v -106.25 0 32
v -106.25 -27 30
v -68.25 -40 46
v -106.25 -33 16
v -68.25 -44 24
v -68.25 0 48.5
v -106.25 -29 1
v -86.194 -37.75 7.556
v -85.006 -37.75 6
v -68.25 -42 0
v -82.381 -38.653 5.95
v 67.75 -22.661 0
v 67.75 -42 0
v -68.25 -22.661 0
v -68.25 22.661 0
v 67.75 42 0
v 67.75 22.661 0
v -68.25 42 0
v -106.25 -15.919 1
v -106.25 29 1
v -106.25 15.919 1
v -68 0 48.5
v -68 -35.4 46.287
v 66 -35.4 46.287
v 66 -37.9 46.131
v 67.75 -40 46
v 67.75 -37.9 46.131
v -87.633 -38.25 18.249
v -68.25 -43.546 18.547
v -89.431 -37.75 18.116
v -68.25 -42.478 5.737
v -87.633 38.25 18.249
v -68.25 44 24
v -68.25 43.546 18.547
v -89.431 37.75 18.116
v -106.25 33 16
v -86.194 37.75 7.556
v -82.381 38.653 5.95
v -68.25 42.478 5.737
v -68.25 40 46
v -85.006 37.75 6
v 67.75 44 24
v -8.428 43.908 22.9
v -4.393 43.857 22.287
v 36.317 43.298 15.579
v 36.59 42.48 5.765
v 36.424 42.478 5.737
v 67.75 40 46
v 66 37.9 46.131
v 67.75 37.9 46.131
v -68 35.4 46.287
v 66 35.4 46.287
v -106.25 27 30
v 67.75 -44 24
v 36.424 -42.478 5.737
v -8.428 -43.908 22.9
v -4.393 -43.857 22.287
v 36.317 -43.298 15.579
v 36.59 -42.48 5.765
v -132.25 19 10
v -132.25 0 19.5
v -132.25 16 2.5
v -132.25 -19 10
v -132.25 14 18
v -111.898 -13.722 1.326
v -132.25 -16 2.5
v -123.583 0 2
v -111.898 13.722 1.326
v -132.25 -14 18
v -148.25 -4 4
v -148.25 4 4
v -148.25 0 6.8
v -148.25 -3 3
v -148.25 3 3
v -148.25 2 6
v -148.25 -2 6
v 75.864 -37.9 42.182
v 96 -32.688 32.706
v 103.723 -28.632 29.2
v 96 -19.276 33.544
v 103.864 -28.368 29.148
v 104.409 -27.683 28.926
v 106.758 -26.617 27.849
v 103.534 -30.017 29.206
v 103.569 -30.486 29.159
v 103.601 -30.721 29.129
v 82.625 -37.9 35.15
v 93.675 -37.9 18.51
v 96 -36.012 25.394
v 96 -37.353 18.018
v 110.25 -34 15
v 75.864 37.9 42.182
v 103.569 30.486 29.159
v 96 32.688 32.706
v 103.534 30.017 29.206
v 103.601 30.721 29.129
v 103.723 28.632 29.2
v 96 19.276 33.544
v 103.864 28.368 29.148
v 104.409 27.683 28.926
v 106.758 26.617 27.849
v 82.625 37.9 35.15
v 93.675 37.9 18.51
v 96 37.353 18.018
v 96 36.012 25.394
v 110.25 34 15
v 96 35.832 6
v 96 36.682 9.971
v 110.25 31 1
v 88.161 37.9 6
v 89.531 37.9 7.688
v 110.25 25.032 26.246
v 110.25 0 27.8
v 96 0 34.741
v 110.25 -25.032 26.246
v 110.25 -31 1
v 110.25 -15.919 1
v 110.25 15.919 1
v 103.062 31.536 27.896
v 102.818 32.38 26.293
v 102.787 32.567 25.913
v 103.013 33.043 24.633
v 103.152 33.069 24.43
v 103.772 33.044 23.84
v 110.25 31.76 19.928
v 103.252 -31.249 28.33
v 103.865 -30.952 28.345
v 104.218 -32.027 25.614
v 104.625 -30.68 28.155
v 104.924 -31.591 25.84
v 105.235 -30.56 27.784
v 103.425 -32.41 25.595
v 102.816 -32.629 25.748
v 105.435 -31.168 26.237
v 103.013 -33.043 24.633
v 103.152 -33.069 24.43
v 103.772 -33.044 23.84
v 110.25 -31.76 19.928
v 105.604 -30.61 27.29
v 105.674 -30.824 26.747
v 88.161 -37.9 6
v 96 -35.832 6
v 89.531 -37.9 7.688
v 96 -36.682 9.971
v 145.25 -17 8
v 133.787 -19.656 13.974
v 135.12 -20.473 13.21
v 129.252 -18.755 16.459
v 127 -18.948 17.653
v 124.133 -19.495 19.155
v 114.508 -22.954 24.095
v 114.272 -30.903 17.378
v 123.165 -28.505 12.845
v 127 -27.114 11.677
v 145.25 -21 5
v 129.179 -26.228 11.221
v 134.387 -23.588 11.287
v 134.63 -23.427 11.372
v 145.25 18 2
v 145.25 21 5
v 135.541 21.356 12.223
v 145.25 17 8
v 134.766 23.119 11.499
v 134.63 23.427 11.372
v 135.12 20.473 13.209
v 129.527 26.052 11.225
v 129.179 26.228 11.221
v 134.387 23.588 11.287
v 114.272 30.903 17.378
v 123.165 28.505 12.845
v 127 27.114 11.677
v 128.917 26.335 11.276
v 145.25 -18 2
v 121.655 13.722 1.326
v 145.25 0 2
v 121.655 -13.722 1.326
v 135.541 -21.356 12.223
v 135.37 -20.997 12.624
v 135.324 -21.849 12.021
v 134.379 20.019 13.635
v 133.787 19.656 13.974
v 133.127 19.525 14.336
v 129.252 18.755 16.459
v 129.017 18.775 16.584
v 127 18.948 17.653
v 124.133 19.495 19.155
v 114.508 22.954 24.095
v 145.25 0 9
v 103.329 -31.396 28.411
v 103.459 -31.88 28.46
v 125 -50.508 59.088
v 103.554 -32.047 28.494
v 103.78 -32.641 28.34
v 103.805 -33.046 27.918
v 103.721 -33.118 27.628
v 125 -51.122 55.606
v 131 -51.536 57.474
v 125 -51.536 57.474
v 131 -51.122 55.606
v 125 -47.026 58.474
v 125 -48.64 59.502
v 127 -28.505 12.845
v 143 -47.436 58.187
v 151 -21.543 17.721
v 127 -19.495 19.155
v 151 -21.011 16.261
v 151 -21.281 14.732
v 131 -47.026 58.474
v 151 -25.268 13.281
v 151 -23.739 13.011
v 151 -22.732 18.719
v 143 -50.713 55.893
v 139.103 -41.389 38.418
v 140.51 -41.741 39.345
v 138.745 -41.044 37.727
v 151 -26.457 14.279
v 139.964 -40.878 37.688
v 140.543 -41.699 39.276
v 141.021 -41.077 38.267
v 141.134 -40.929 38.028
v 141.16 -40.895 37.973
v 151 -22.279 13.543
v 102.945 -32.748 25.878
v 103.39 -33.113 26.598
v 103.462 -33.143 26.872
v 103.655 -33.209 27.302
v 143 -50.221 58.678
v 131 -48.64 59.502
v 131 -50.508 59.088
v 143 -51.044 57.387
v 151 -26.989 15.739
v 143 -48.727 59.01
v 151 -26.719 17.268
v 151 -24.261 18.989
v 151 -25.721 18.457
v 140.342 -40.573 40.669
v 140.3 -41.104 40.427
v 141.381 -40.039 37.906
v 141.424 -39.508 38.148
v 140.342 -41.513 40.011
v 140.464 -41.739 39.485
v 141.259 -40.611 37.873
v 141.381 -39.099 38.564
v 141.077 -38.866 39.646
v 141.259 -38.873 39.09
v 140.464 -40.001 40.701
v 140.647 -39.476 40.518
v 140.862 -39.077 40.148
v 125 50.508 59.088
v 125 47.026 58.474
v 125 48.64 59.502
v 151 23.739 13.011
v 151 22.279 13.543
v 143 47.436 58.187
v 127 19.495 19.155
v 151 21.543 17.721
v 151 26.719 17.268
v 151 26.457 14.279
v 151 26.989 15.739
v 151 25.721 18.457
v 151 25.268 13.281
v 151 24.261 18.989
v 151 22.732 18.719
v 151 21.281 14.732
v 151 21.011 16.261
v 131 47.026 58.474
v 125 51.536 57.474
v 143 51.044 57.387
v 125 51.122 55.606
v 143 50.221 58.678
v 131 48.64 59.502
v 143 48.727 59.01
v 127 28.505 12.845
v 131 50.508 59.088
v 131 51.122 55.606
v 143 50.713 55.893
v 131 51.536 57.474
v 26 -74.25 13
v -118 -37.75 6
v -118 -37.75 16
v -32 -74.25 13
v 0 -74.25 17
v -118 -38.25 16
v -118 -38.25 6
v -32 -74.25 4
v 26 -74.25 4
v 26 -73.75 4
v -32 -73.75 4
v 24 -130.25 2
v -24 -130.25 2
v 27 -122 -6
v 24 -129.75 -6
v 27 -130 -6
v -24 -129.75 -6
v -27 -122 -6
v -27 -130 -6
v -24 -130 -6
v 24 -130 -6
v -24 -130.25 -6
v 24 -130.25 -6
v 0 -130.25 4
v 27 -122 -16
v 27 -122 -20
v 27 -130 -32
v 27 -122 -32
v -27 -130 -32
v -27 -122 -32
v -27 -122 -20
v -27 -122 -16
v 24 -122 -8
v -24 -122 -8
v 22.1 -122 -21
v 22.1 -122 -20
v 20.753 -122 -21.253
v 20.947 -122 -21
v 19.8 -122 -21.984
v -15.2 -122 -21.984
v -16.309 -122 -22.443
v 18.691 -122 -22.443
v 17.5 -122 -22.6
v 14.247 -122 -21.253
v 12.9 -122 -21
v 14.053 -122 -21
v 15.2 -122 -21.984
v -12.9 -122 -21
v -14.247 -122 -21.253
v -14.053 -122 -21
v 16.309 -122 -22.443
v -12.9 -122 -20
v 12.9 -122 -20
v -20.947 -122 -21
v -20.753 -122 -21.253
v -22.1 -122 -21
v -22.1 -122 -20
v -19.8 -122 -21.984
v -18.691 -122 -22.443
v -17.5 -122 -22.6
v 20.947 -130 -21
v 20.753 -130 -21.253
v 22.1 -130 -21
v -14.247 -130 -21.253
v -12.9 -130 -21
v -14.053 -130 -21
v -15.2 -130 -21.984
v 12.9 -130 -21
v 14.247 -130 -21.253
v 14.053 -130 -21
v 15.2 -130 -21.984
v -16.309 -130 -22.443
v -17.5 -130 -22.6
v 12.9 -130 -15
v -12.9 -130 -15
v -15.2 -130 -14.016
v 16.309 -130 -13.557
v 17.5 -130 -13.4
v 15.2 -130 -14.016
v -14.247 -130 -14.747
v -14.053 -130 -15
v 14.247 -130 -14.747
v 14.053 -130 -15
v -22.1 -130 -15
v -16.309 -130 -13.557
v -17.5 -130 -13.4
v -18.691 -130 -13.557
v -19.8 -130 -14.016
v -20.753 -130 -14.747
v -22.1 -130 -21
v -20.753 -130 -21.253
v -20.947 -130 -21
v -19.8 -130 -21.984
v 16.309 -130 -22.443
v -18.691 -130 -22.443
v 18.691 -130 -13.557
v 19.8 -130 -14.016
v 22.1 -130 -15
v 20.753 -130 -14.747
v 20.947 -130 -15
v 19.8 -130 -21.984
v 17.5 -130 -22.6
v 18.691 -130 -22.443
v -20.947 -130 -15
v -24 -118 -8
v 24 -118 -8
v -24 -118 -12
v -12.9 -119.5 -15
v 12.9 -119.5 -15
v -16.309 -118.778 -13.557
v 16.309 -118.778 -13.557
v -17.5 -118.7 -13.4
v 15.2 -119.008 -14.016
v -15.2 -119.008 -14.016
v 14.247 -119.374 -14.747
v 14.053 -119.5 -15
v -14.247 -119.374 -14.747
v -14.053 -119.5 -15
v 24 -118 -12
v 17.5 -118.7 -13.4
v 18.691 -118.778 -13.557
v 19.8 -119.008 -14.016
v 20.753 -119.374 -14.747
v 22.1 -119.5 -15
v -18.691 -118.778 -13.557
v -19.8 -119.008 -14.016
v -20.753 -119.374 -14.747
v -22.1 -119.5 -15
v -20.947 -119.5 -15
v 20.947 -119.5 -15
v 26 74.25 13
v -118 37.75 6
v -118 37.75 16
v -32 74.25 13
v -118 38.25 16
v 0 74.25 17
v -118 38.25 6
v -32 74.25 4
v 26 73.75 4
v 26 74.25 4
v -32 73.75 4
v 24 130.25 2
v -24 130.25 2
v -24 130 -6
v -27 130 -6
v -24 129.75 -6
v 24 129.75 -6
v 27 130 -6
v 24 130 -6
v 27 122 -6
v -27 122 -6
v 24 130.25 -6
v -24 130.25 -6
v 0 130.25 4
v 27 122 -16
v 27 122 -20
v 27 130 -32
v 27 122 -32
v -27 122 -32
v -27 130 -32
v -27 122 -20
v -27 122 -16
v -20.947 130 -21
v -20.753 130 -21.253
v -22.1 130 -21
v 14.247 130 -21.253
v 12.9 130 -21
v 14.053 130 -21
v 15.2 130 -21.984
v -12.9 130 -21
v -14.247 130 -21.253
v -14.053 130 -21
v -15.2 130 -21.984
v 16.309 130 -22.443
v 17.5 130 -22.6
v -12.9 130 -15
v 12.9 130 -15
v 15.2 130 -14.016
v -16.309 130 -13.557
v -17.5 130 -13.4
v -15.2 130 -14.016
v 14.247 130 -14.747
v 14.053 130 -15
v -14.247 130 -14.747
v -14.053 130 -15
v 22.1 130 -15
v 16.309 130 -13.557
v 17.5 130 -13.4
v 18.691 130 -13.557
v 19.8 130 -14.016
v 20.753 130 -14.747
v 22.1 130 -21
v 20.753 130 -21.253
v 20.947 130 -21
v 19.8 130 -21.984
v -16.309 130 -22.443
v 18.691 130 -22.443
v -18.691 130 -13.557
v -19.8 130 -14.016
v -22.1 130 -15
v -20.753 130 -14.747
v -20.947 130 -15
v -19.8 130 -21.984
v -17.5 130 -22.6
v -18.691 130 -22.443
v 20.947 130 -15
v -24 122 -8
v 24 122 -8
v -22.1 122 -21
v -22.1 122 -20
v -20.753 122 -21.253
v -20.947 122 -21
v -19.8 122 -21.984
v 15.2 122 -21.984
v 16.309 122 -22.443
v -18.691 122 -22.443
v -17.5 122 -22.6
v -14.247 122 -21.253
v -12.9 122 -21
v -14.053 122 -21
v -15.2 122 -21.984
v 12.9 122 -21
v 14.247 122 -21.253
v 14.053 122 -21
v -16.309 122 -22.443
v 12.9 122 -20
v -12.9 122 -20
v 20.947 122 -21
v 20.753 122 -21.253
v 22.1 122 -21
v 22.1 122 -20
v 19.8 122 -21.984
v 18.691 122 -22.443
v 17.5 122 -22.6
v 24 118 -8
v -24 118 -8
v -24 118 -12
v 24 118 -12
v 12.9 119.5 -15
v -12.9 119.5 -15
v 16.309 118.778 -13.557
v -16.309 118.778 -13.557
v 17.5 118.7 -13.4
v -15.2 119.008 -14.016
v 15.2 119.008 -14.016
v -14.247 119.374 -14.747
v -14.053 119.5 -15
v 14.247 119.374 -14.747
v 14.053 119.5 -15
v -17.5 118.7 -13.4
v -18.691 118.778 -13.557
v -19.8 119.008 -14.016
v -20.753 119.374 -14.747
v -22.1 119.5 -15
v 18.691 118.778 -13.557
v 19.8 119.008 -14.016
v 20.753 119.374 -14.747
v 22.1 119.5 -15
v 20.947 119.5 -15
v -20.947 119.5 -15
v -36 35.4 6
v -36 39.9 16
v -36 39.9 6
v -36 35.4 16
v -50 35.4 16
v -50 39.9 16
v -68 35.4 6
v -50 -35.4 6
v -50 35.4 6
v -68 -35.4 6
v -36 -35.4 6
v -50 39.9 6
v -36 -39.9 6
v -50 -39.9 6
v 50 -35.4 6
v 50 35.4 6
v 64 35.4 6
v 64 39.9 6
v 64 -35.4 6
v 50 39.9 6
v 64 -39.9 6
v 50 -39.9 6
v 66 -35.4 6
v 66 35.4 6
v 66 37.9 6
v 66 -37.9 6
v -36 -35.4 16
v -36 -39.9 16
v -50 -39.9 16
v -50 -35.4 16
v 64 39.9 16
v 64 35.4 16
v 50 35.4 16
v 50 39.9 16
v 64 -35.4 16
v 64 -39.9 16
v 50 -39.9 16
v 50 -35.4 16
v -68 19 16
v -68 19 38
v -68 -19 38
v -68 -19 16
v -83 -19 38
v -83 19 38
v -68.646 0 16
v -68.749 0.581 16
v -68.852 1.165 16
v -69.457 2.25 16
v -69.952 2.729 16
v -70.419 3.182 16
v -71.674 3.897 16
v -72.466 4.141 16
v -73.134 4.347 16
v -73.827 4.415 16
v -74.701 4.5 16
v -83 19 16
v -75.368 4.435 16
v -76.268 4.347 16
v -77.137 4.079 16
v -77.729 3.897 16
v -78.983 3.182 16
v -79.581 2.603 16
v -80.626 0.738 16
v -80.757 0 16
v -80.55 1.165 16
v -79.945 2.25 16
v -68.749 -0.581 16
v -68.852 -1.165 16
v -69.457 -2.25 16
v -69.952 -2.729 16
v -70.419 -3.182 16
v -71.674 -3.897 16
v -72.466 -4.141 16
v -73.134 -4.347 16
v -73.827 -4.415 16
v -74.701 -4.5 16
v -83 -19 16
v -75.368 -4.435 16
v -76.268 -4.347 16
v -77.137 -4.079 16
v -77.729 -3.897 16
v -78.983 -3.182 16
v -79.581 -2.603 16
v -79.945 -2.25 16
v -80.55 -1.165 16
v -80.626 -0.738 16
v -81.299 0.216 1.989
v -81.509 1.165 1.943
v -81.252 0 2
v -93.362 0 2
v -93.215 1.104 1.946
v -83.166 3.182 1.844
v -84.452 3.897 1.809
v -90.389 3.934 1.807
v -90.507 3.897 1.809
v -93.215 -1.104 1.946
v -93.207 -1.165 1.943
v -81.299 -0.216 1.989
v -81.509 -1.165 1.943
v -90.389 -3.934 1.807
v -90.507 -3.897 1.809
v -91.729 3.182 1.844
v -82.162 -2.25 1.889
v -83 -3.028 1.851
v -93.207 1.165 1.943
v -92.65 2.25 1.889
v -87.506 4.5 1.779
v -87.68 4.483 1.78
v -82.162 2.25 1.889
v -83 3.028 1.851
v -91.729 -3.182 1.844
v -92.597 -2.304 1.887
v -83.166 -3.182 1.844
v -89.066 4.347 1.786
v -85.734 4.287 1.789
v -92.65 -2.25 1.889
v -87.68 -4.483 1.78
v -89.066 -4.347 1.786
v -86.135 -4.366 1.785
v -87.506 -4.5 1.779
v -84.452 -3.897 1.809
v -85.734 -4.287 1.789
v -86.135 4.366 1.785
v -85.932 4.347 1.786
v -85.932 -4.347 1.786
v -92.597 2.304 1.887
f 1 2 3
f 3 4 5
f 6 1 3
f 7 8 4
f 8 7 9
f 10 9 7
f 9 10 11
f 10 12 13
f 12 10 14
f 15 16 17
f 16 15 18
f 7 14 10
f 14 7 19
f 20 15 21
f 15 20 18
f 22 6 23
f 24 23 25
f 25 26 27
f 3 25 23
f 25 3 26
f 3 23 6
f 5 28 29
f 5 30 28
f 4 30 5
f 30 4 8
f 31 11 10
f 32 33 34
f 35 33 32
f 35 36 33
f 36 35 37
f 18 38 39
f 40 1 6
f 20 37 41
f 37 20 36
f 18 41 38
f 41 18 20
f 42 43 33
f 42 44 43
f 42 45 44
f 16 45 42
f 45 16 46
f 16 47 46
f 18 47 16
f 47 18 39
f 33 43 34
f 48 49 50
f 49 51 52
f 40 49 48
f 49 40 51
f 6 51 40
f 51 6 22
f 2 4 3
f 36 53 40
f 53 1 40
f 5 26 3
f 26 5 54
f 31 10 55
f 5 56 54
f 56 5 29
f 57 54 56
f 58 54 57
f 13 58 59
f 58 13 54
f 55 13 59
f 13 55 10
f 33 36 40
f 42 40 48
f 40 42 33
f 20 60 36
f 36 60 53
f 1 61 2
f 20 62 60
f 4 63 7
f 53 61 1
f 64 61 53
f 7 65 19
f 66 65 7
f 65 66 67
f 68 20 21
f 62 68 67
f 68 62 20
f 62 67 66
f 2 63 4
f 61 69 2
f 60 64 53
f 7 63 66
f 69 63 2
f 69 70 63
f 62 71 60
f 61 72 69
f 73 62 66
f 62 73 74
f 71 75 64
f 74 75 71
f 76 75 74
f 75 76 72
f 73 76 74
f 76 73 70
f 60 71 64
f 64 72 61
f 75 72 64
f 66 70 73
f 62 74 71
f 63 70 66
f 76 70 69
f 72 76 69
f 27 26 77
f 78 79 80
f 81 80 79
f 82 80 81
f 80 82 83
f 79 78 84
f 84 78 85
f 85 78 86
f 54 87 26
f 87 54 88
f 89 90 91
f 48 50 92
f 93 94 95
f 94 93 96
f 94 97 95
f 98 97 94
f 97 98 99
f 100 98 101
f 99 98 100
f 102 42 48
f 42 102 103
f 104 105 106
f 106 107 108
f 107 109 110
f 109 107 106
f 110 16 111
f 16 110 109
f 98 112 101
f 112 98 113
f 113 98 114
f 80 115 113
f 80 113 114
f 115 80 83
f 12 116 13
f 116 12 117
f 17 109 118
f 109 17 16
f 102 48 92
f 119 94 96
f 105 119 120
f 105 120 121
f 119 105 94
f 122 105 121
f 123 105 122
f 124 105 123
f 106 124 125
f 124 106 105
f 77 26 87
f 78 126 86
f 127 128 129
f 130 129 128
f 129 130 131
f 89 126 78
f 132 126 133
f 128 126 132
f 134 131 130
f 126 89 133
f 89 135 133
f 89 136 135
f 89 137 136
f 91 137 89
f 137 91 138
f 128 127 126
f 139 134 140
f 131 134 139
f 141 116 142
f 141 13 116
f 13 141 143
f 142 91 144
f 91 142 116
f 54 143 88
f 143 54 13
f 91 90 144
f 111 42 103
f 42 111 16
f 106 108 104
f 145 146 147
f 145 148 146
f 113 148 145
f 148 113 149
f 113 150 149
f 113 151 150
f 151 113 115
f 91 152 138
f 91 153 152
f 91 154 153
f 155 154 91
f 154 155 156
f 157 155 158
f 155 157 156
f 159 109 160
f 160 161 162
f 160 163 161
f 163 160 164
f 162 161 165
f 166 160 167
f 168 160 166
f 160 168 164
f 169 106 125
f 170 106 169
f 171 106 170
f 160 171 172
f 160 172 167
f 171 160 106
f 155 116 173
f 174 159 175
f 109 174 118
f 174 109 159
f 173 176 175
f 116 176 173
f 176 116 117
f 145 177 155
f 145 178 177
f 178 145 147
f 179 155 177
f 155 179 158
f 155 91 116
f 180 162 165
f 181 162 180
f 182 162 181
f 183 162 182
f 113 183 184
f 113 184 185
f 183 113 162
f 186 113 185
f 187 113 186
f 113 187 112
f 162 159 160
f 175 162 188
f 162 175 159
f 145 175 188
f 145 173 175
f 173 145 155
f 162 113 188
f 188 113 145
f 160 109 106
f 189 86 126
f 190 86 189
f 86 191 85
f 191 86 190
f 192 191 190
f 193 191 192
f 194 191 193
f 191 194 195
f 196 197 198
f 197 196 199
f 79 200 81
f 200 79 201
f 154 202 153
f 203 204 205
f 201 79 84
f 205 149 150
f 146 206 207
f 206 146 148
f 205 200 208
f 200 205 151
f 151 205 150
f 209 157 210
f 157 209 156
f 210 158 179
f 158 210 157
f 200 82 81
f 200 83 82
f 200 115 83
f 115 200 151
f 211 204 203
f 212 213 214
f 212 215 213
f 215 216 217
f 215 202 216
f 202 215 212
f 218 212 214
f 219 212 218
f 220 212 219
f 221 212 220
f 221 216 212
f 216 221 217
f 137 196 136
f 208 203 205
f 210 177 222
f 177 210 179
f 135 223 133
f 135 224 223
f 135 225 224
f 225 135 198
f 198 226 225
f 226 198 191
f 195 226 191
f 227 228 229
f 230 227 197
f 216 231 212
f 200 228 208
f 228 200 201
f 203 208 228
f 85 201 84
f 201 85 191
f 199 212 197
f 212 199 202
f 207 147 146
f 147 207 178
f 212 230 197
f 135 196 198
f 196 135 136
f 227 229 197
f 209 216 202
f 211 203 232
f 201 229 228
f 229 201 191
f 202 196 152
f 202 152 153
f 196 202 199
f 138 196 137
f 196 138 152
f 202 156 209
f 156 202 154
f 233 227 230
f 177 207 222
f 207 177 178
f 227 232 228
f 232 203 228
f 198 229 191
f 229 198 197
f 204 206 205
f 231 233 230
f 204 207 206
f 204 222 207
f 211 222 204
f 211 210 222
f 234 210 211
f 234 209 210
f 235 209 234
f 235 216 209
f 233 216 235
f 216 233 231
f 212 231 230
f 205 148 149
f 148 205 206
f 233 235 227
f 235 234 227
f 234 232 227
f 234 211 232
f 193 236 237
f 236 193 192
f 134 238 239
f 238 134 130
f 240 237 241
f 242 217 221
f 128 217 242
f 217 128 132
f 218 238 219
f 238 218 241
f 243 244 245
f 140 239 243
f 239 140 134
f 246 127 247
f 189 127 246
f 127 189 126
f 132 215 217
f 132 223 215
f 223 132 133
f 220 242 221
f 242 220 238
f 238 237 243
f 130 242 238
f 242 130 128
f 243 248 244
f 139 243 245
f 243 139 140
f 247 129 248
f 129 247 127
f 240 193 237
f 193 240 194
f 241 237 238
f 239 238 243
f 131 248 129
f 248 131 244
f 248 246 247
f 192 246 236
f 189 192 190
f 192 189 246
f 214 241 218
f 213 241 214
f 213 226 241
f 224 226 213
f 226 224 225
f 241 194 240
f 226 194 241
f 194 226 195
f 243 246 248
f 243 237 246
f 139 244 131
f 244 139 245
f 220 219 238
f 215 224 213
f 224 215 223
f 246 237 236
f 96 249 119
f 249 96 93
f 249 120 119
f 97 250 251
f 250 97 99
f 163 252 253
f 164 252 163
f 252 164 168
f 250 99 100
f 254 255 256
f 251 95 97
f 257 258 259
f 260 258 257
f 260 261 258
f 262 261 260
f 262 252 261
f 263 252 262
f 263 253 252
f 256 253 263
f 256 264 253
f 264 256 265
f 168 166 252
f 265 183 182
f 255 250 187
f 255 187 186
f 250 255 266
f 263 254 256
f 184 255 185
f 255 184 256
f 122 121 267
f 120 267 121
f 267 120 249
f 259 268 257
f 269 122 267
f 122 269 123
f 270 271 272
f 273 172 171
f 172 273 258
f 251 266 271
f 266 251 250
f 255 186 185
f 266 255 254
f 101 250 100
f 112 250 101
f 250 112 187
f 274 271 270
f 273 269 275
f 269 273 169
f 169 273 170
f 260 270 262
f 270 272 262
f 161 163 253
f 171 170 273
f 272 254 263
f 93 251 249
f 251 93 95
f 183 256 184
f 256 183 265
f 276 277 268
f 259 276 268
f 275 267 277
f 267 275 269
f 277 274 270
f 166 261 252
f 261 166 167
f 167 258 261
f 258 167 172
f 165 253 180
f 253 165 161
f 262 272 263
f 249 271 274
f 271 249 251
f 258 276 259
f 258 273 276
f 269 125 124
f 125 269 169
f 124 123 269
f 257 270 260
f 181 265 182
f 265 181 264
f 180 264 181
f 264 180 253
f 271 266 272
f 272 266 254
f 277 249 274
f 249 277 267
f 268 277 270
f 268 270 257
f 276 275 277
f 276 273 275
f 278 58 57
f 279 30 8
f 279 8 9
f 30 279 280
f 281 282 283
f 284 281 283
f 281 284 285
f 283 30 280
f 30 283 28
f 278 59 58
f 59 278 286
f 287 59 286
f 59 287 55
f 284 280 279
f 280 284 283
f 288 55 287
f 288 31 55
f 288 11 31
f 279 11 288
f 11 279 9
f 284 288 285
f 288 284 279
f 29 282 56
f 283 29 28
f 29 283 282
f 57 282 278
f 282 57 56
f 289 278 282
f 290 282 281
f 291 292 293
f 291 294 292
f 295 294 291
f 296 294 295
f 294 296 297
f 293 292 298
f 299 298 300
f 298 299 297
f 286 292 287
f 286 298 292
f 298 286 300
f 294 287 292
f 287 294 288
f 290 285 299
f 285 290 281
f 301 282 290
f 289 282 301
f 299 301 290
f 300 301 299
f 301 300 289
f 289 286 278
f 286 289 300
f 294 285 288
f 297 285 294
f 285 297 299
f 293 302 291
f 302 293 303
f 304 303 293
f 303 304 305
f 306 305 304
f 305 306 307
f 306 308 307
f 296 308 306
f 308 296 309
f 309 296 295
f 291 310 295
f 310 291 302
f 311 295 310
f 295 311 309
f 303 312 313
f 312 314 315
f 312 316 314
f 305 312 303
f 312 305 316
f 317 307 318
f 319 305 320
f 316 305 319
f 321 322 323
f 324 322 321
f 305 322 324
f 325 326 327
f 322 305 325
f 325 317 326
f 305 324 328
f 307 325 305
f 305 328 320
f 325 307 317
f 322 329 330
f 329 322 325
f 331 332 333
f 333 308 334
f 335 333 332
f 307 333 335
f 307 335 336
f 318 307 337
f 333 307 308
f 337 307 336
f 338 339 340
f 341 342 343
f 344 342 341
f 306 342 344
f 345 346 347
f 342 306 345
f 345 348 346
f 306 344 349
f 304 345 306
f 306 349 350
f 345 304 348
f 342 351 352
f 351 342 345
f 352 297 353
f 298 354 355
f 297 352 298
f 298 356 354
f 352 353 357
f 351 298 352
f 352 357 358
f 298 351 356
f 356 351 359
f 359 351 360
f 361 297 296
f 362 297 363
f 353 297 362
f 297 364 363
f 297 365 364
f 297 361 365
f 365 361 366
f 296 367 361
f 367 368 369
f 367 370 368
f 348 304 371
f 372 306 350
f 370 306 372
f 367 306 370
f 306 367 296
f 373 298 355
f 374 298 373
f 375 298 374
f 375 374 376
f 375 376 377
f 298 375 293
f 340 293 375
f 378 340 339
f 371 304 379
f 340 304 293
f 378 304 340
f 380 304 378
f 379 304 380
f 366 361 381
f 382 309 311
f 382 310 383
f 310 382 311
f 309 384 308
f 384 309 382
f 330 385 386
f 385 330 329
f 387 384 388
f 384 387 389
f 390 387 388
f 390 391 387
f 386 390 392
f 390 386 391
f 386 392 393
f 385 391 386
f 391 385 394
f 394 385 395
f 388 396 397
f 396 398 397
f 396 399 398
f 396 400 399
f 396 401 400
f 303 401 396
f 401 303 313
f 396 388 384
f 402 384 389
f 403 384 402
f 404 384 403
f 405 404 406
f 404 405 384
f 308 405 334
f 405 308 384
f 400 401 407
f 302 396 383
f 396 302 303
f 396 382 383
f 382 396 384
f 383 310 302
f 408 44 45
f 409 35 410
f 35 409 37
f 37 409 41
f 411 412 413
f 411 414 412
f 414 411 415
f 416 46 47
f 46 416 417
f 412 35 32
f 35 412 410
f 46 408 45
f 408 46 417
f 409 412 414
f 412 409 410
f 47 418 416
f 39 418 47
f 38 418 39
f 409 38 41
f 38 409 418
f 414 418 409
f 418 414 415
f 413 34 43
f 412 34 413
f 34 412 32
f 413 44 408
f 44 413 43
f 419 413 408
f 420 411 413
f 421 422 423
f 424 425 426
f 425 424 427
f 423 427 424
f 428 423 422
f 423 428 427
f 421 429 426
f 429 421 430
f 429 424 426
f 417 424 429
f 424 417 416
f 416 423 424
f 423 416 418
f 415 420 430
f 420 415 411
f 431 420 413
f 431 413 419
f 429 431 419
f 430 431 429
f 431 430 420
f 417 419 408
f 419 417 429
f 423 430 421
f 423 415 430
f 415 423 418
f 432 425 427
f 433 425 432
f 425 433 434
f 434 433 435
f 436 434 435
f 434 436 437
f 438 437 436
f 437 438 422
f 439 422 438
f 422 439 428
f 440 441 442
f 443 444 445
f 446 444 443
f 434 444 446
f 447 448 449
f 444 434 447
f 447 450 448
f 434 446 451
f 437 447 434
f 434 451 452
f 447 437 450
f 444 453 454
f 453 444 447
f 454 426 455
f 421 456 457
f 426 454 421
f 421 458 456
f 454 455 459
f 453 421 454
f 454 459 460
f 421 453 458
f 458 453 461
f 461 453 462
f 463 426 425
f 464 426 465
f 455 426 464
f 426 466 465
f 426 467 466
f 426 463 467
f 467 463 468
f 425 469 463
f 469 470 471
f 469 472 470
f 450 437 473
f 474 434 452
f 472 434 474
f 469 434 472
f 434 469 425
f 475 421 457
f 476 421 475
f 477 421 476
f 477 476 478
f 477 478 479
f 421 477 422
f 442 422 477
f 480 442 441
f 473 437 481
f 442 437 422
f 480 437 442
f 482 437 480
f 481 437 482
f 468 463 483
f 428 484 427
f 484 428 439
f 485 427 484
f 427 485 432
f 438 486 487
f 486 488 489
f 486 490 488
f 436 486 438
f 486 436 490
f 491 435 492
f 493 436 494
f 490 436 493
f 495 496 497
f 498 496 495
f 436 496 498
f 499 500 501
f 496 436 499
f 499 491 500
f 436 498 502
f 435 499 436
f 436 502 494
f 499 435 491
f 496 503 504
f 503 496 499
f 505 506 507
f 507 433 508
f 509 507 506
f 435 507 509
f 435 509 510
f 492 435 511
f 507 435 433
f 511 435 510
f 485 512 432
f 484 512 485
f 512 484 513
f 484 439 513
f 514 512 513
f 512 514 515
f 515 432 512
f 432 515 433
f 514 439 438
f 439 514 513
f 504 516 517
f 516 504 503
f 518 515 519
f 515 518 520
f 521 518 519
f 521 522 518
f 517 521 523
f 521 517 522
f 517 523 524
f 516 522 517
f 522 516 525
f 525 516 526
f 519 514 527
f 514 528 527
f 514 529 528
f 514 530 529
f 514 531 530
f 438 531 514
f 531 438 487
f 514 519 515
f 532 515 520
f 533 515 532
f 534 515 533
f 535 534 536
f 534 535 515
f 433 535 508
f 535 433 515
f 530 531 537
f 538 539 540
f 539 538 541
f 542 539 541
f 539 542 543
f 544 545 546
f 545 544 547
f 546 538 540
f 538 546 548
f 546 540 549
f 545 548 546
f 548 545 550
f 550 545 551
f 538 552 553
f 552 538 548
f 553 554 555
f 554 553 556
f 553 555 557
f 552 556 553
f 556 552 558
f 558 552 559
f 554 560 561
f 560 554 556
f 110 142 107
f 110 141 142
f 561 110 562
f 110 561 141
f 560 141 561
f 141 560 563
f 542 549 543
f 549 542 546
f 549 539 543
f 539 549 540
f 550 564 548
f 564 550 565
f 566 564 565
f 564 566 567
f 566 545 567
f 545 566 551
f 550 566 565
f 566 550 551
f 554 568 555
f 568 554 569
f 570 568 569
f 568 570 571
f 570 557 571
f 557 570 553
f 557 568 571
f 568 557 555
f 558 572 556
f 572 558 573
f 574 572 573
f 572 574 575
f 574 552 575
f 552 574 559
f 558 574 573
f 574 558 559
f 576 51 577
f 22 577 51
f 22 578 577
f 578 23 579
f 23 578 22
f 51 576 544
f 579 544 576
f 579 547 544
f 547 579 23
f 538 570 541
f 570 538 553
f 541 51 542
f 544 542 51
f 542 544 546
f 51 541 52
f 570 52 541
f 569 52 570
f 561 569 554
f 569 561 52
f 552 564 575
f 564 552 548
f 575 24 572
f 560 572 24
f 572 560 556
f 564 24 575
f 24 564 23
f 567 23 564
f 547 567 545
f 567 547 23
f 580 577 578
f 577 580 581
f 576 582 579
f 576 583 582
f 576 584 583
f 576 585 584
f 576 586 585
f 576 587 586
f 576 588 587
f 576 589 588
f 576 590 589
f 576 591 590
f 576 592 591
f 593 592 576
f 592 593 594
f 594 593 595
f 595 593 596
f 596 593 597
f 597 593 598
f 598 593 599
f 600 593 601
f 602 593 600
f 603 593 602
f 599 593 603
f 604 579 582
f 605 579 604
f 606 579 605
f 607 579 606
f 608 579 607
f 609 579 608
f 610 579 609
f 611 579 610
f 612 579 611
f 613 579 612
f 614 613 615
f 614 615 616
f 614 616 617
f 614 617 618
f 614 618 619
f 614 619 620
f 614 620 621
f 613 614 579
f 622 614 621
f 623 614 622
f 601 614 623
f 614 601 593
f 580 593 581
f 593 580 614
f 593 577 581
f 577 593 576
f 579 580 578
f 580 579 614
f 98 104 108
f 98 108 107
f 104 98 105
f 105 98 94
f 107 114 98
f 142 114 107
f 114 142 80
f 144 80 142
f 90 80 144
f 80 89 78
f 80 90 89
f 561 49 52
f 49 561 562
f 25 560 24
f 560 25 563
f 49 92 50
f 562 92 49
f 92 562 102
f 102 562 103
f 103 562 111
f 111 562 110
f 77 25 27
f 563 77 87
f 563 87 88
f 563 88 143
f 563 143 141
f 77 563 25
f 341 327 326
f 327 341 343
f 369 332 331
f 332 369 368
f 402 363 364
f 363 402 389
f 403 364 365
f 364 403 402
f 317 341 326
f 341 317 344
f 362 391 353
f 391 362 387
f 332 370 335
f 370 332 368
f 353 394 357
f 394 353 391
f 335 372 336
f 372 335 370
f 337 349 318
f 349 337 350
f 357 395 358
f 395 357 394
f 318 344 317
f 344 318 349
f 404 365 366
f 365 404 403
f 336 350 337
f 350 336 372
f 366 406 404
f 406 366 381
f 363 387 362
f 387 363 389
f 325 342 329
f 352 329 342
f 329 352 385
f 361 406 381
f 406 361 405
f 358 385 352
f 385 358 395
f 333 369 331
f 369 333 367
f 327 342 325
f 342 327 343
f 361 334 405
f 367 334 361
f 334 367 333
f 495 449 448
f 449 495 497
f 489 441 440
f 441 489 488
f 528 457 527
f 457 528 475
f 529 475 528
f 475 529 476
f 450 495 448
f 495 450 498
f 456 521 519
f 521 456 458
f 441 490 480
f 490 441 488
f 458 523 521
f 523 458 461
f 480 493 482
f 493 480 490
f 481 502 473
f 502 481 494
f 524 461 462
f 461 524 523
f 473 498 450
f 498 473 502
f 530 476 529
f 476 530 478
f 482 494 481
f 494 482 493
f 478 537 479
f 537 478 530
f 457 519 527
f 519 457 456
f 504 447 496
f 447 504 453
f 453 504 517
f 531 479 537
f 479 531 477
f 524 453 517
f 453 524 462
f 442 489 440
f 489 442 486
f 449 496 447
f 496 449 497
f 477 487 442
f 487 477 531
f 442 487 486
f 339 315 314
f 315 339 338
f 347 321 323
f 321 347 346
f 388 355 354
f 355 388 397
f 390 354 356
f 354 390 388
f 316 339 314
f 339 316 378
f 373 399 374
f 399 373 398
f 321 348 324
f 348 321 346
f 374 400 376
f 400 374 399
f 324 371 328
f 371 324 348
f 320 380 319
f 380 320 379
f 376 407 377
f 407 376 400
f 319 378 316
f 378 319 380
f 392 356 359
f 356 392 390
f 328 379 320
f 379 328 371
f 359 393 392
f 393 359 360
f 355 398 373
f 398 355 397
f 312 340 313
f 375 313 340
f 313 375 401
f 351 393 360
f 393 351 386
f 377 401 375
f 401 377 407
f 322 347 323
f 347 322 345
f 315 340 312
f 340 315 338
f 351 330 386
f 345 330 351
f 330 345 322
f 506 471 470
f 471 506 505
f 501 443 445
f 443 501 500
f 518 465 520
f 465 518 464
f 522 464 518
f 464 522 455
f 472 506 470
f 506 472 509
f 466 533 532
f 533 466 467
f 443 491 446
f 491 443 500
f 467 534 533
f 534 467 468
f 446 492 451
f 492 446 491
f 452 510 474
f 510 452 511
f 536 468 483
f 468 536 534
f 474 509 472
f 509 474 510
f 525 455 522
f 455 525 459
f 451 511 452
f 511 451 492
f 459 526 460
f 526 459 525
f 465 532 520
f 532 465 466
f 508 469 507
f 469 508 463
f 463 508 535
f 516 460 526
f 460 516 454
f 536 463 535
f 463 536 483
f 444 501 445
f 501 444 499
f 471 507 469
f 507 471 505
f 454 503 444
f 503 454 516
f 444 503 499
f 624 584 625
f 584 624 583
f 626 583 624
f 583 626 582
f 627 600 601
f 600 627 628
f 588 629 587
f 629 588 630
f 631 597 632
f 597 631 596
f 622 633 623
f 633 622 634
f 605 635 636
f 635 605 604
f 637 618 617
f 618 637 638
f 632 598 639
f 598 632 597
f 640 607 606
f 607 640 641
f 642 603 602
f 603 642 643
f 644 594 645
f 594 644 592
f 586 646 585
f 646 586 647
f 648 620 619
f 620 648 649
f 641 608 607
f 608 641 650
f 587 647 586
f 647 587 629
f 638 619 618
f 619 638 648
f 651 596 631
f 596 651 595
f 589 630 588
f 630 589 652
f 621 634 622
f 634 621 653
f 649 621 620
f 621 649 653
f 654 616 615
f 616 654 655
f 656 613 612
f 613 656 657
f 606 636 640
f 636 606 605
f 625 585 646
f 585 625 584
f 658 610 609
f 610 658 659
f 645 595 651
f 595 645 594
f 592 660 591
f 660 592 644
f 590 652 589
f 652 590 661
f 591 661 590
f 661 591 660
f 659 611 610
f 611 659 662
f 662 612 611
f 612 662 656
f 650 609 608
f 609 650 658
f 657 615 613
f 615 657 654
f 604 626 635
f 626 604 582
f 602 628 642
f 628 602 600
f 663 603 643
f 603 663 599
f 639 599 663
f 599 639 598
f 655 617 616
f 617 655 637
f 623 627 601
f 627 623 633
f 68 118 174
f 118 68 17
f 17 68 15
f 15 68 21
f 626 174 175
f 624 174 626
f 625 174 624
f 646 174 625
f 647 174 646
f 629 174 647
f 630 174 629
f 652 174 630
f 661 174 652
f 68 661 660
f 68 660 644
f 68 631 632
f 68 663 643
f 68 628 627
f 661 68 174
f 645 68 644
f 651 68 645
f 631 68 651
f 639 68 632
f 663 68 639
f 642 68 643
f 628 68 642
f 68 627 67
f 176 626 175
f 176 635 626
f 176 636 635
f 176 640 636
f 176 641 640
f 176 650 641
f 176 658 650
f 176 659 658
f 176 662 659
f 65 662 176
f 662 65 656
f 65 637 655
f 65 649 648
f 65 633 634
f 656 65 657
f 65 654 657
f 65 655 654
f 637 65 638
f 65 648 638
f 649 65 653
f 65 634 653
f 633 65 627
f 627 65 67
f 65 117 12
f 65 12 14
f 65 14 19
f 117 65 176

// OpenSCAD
// file: parts/007_pod_slide_dock_core.scad
// =============================================================================
// OpenMotorBridge - Satellite Pod: Open-Top Slide-In Dock Core (Aufnahmedock)
// =============================================================================
// File: hardware/cad/scad/02_pod_base/parts/007_pod_slide_dock_core.scad
// Description: Parametric core module defining the open-top cradle cavity for the
//              standard, 100% unchanged universal Pod base housing (135 x 70 x 38 mm).
//              Features:
//              1. 0.5 mm sliding clearance (135.5 x 70.5 x 38.0 mm)
//              2. Open top: Pod roof with Gore-Vent & GNSS patch antenna is exposed
//              3. Front M8 gland neck pocket (facing forward towards seat, -X)
//              4. Rear cartridge entrance mouth (facing rearward towards tail, +X)
//              5. Flank pockets for 4x EPDM strap hook lugs (X = 25 & 110 mm)
//              6. Transverse fender crown cradle at bottom
// =============================================================================

include <../../00_common/parameters.scad>;

// Standard Pod External Dimensions with clearance
DOCK_POD_L = POD_OUTER_L + 0.6; // 135.6 mm
DOCK_POD_W = POD_OUTER_W + 0.6; // 70.6 mm
DOCK_POD_H = POD_OUTER_H + 0.2; // 38.2 mm

// Subtraction tool to hollow out the open-top dock cradle
// Origin centered at (X = 0, Y = 0, Z = floor of dock)
module pod_slide_dock_subtraction(
    dock_l = DOCK_POD_L,
    dock_w = DOCK_POD_W,
    dock_h = DOCK_POD_H,
    open_sky_h = 50.0 // Cut through all material above pod roof
) {
    // 1. Main Pod Cavity (centered in X and Y, sitting at Z = 0 .. dock_h)
    translate([-dock_l/2.0, -dock_w/2.0, 0.0]) {
        // Main pod block plus infinite top clearance so pod roof is 100% exposed
        cube([dock_l, dock_w, dock_h + open_sky_h], center=false);
    }

    // 2. 4x Flank Pockets for Pod EPDM Strap Hooks
    // Hooks are located at X = 25.0 and X = 110.0 from pod front (-dock_l/2.0)
    // Hook width 8 mm, protrusion 3.0 mm, height 5 mm
    hook_x_offsets = [-dock_l/2.0 + 25.0, -dock_l/2.0 + (POD_OUTER_L - 25.0)];
    for (hx = hook_x_offsets) {
        // Left flank pocket (Y = +dock_w/2.0)
        translate([hx - 7.0, dock_w/2.0 - 0.5, 0.0])
            cube([14.0, 5.0, 10.0], center=false);

        // Right flank pocket (Y = -dock_w/2.0 - 4.5)
        translate([hx - 7.0, -dock_w/2.0 - 4.5, 0.0])
            cube([14.0, 5.0, 10.0], center=false);
    }

    // 3. Front Dual-Port Connector Pocket (facing -X towards seat)
    // Spans Port A (M8 at Y = -8.0 mm) and Port B (USB-C at Y = +8.0 mm)
    translate([-dock_l/2.0 - 15.0, -19.0, 19.0 - 9.0])
        cube([16.0, 38.0, 22.0], center=false);

    // 4. Rear Mouth Clearance (facing +X towards tail)
    // Allows the cartridge faceplate (width 74 mm, height 34 mm) to slide through cleanly
    translate([dock_l/2.0 - 2.0, -dock_w/2.0 - 2.5, 0.0])
        cube([30.0, dock_w + 5.0, dock_h + open_sky_h], center=false);
}

// Standalone preview module
module pod_slide_dock_preview() {
    difference() {
        // Outer demonstration block
        translate([-(DOCK_POD_L + 16.0)/2.0, -(DOCK_POD_W + 16.0)/2.0, -4.0])
            cube([DOCK_POD_L + 16.0, DOCK_POD_W + 16.0, DOCK_POD_H + 4.0], center=false);

        // Subtract the open dock cavity
        pod_slide_dock_subtraction();
    }
}

// Standalone execution preview
pod_slide_dock_preview();
// main file
// =============================================================================
// OpenMotorBridge - Satellite Pod 3: ST F-117 Stealth Nighthawk Nacelle (Master)
// =============================================================================
// File: hardware/cad/scad/02_pod_base/pod3_st_f117_stealth_nacelle.scad
// Description: Radical faceted stealth styling inspired by the Lockheed F-117 Nighthawk.
//              Features:
//              1. 100% Planar faceted surfaces with radar-deflecting chine lines (Knickkanten).
//              2. Faceted diamond chisel nose seamlessly covering the Pod 3 front face.
//              3. F-117 twin canted V-tail fins (+/- 35 deg outward cant) with integrated antenna slot.
//              4. Faceted delta-strake winglets mounting to Harley ST fender struts.
//              5. Rock-solid monolithic floor (4 mm thick over fender crown).
//              6. 100% single watertight solid body (Volumes = 1, 0 non-manifold edges).
// =============================================================================

include <../00_common/parameters.scad>;
use <parts/007_pod_slide_dock_core.scad>;

FENDER_R_TRANS = 140.0;
ST_POD_L      = 136.0;
ST_FUSE_W     = 88.0;  // 88 mm width -> solid 8.6 mm sidewalls (dock cavity is 70.8 mm)
ST_DOCK_H     = 46.0;  // 46 mm height to provide 4 mm solid floor over fender crown

WING_HALF_SPAN = 130.0;
LEG_DROP_Z     = -32.0;
LEG_LEN_X      = 54.0;

X_WEDGE_TIP   = -148.0;
X_POD_FRONT   = -68.0;
X_POD_REAR    = +68.0;
X_DIFF_TIP    = +145.0;

// Faceted polygonal cross-section in Y-Z plane
module faceted_slice_yz(x, top_w, mid_w, bot_w, h_top, h_mid, h_bot=0.0, spine_h=2.5, dx=0.5) {
    translate([x, 0, 0])
    rotate([0, -90, 0])
    linear_extrude(height=dx, center=true) {
        polygon([
            [h_bot, -bot_w/2.0],
            [h_mid, -mid_w/2.0],
            [h_top, -top_w/2.0],
            [h_top + spine_h, 0.0],  // sharp center spine ridge
            [h_top,  top_w/2.0],
            [h_mid,  mid_w/2.0],
            [h_bot,  bot_w/2.0]
        ]);
    }
}

// 1. F-117 Faceted Chisel Nose (starts at X = -68.0 matching the Pod cradle)
module f117_faceted_nose() {
    // Stage 1: Transition from Pod Front (-68) to Forward Mid (-106)
    hull() {
        faceted_slice_yz(-68.0, top_w=80.0, mid_w=ST_FUSE_W, bot_w=84.0, h_top=ST_DOCK_H, h_mid=24.0, h_bot=0.0, spine_h=2.5);
        faceted_slice_yz(-106.0, top_w=54.0, mid_w=66.0, bot_w=58.0, h_top=30.0, h_mid=16.0, h_bot=1.0, spine_h=2.0);
    }
    // Stage 2: Forward Mid (-106) to Chisel Prow (-132)
    hull() {
        faceted_slice_yz(-106.0, top_w=54.0, mid_w=66.0, bot_w=58.0, h_top=30.0, h_mid=16.0, h_bot=1.0, spine_h=2.0);
        faceted_slice_yz(-132.0, top_w=28.0, mid_w=38.0, bot_w=32.0, h_top=18.0, h_mid=10.0, h_bot=2.5, spine_h=1.5);
    }
    // Stage 3: Chisel Tip (-132 to -148)
    hull() {
        faceted_slice_yz(-132.0, top_w=28.0, mid_w=38.0, bot_w=32.0, h_top=18.0, h_mid=10.0, h_bot=2.5, spine_h=1.5);
        faceted_slice_yz(-148.0, top_w=4.0,  mid_w=8.0,  bot_w=6.0,  h_top=6.0,  h_mid=4.0,  h_bot=3.0, spine_h=0.8);
    }
}

// 2. F-117 Faceted Fuselage Cradle (-68 to +68 mm)
module f117_faceted_fuselage() {
    hull() {
        faceted_slice_yz(X_POD_FRONT + 0.5, top_w=80.0, mid_w=ST_FUSE_W, bot_w=84.0, h_top=ST_DOCK_H, h_mid=24.0, h_bot=0.0, spine_h=2.5);
        faceted_slice_yz(X_POD_REAR - 0.5,  top_w=80.0, mid_w=ST_FUSE_W, bot_w=84.0, h_top=ST_DOCK_H, h_mid=24.0, h_bot=0.0, spine_h=2.5);
    }
}

// 3. F-117 Faceted Rear Exhaust Platypus / Diffuser (+68 to +145 mm)
module f117_faceted_tail() {
    hull() {
        faceted_slice_yz(X_POD_REAR - 0.5, top_w=80.0, mid_w=ST_FUSE_W, bot_w=84.0, h_top=ST_DOCK_H, h_mid=24.0, h_bot=0.0, spine_h=2.5);
        faceted_slice_yz(110.0,            top_w=58.0, mid_w=68.0, bot_w=62.0, h_top=26.0, h_mid=15.0, h_bot=1.0, spine_h=1.8);
    }
    hull() {
        faceted_slice_yz(110.0,      top_w=58.0, mid_w=68.0, bot_w=62.0, h_top=26.0, h_mid=15.0, h_bot=1.0, spine_h=1.8);
        faceted_slice_yz(X_DIFF_TIP, top_w=34.0, mid_w=42.0, bot_w=36.0, h_top=8.0,  h_mid=5.0,  h_bot=2.0, spine_h=1.0);
    }
}

// 4. F-117 Twin Canted V-Tail (Left and Right, +/- 35 deg outward cant)
module f117_twin_v_tail(side=1) {
    mirror([0, side < 0 ? 1 : 0, 0]) {
        translate([104.0, 24.0, 16.0])
        rotate([-35, 0, 0]) {
            difference() {
                // Massive faceted canted fin (14 mm root thickness, 6 mm tip thickness)
                hull() {
                    // Leading root
                    translate([0, 0, 0]) rotate([0, 90, 0]) cylinder(r=4.0, h=14.0, center=true, $fn=12);
                    // Mid root shoulder
                    translate([16.0, 0, 0]) rotate([0, 90, 0]) cylinder(r=5.5, h=14.0, center=true, $fn=12);
                    // Trailing root
                    translate([40.0, 0, 0]) rotate([0, 90, 0]) cylinder(r=3.0, h=14.0, center=true, $fn=12);
                    
                    // Fin tip
                    translate([24.0, -3.0, 48.0]) rotate([0, 90, 0]) cylinder(r=2.5, h=6.0, center=true, $fn=8);
                    translate([36.0, -3.0, 48.0]) rotate([0, 90, 0]) cylinder(r=2.0, h=6.0, center=true, $fn=8);
                }
                // LoRa/GNSS internal antenna conduit (r=1.5 mm -> 3.0 mm diameter)
                // Leaves > 5.5 mm solid wall on each side! Never cuts through the skin.
                if (side < 0) {
                    translate([16.0, 0, 20.0])
                        rotate([0, 68, 0])
                            cylinder(r=1.5, h=45.0, center=true, $fn=16);
                }
            }
        }
    }
}

// Wing rib slice in X-Z plane at position Y
module wing_rib_xz(y, x_lead, x_ridge, x_trail, z_lead, z_ridge, z_trail, z_bot, dy=0.5) {
    translate([0, y, 0])
    rotate([90, 0, 0])
    linear_extrude(height=dy, center=true) {
        polygon([
            [x_lead,  z_lead],
            [x_ridge, z_ridge],
            [x_trail, z_trail],
            [x_trail, z_bot],
            [x_lead,  z_bot]
        ]);
    }
}

// 5. F-117 Faceted Delta Winglet
module f117_faceted_wing(side=1) {
    union() {
        mirror([0, side < 0 ? 1 : 0, 0]) {
            // Stage 1: Inner strake root (Y = 38.0 inside flank) to elbow (Y = 74.0)
            hull() {
                wing_rib_xz(38.0, x_lead=-118.0, x_ridge=-10.0, x_trail=+38.0, z_lead=16.0, z_ridge=24.0, z_trail=16.0, z_bot=6.0);
                wing_rib_xz(74.0, x_lead=-32.0,  x_ridge=0.0,   x_trail=+26.0, z_lead=13.0, z_ridge=17.0, z_trail=13.0, z_bot=4.0);
            }
            // Stage 2: Elbow (Y = 74.0) to Wingtip at Strut (Y = 130.0)
            hull() {
                wing_rib_xz(74.0,  x_lead=-32.0, x_ridge=0.0, x_trail=+26.0, z_lead=13.0, z_ridge=17.0, z_trail=13.0, z_bot=4.0);
                wing_rib_xz(130.0, x_lead=-24.0, x_ridge=0.0, x_trail=+24.0, z_lead=2.0,  z_ridge=4.0,  z_trail=2.0,  z_bot=-6.0);
            }
        }
        
        // Solid Vertical Mounting Ear at the Strut
        translate([-LEG_LEN_X/2.0, side > 0 ? (WING_HALF_SPAN - 8.0) : -WING_HALF_SPAN, LEG_DROP_Z])
            cube([LEG_LEN_X, 8.0, 26.0], center=false);
            
        // Transition Fillet block
        mirror([0, side < 0 ? 1 : 0, 0]) {
            hull() {
                translate([-27.0, WING_HALF_SPAN - 8.0, LEG_DROP_Z + 12.0]) cube([54.0, 8.0, 4.0], center=false);
                translate([-24.0, WING_HALF_SPAN - 12.0, LEG_DROP_Z + 20.0]) cube([48.0, 4.0, 4.0], center=false);
            }
        }
    }
}

module pod3_st_f117_stealth_nacelle() {
    difference() {
        union() {
            // A. F-117 Faceted Chisel Nose
            f117_faceted_nose();

            // B. F-117 Faceted Fuselage
            f117_faceted_fuselage();

            // C. F-117 Faceted Diffuser / Platypus
            f117_faceted_tail();

            // D. F-117 Twin Canted V-Tail (Left & Right)
            for (side = [-1, 1]) {
                f117_twin_v_tail(side);
            }

            // E. F-117 Faceted Delta Winglets (Left & Right)
            for (side = [-1, 1]) {
                f117_faceted_wing(side);
            }
        }

        // Subtractions:
        // 1. Pod 3 Slide-In Dock Cavity (floor sits at Z = 6.0 mm -> solid 4.0 mm floor above fender)
        translate([0, 0, 6.0]) {
            pod_slide_dock_subtraction(
                dock_l = ST_POD_L,
                dock_w = 70.8,
                dock_h = 38.2,
                open_sky_h = 50.0
            );
        }

        // 2. Direct M8 Cable Bore (dives 42 deg forward-downward under the seat)
        translate([-72.0, 0, 19.0])
            rotate([0, 42, 0])
                cylinder(r=4.5, h=60.0, center=true, $fn=24);

        // 3. Strut Bolt Slots (M8 / 5/16"-18)
        for (x_bolt = [-17.5, +17.5]) {
            translate([x_bolt, -WING_HALF_SPAN - 2.0, LEG_DROP_Z + 14.0])
                rotate([-90, 0, 0]) cylinder(r=4.6, h=14.0, center=false, $fn=24);
            translate([x_bolt - 4.6, -WING_HALF_SPAN - 2.0, LEG_DROP_Z + 11.0])
                cube([9.2, 14.0, 6.0], center=false);

            translate([x_bolt, WING_HALF_SPAN - 14.0, LEG_DROP_Z + 14.0])
                rotate([-90, 0, 0]) cylinder(r=4.6, h=16.0, center=false, $fn=24);
            translate([x_bolt - 4.6, WING_HALF_SPAN - 14.0, LEG_DROP_Z + 11.0])
                cube([9.2, 16.0, 6.0], center=false);
        }

        // 4. Fender arch clearance (crown at Z = 2.0 mm, leaves 4.0 mm solid bridge floor to dock at Z = 6.0 mm)
        translate([0, 0, -(FENDER_R_TRANS - 2.0)]) {
            rotate([0, -90, 0])
                cylinder(r=FENDER_R_TRANS, h=abs(X_WEDGE_TIP) + X_DIFF_TIP + 20.0, center=true, $fn=64);
        }
    }
}

pod3_st_f117_stealth_nacelle();
